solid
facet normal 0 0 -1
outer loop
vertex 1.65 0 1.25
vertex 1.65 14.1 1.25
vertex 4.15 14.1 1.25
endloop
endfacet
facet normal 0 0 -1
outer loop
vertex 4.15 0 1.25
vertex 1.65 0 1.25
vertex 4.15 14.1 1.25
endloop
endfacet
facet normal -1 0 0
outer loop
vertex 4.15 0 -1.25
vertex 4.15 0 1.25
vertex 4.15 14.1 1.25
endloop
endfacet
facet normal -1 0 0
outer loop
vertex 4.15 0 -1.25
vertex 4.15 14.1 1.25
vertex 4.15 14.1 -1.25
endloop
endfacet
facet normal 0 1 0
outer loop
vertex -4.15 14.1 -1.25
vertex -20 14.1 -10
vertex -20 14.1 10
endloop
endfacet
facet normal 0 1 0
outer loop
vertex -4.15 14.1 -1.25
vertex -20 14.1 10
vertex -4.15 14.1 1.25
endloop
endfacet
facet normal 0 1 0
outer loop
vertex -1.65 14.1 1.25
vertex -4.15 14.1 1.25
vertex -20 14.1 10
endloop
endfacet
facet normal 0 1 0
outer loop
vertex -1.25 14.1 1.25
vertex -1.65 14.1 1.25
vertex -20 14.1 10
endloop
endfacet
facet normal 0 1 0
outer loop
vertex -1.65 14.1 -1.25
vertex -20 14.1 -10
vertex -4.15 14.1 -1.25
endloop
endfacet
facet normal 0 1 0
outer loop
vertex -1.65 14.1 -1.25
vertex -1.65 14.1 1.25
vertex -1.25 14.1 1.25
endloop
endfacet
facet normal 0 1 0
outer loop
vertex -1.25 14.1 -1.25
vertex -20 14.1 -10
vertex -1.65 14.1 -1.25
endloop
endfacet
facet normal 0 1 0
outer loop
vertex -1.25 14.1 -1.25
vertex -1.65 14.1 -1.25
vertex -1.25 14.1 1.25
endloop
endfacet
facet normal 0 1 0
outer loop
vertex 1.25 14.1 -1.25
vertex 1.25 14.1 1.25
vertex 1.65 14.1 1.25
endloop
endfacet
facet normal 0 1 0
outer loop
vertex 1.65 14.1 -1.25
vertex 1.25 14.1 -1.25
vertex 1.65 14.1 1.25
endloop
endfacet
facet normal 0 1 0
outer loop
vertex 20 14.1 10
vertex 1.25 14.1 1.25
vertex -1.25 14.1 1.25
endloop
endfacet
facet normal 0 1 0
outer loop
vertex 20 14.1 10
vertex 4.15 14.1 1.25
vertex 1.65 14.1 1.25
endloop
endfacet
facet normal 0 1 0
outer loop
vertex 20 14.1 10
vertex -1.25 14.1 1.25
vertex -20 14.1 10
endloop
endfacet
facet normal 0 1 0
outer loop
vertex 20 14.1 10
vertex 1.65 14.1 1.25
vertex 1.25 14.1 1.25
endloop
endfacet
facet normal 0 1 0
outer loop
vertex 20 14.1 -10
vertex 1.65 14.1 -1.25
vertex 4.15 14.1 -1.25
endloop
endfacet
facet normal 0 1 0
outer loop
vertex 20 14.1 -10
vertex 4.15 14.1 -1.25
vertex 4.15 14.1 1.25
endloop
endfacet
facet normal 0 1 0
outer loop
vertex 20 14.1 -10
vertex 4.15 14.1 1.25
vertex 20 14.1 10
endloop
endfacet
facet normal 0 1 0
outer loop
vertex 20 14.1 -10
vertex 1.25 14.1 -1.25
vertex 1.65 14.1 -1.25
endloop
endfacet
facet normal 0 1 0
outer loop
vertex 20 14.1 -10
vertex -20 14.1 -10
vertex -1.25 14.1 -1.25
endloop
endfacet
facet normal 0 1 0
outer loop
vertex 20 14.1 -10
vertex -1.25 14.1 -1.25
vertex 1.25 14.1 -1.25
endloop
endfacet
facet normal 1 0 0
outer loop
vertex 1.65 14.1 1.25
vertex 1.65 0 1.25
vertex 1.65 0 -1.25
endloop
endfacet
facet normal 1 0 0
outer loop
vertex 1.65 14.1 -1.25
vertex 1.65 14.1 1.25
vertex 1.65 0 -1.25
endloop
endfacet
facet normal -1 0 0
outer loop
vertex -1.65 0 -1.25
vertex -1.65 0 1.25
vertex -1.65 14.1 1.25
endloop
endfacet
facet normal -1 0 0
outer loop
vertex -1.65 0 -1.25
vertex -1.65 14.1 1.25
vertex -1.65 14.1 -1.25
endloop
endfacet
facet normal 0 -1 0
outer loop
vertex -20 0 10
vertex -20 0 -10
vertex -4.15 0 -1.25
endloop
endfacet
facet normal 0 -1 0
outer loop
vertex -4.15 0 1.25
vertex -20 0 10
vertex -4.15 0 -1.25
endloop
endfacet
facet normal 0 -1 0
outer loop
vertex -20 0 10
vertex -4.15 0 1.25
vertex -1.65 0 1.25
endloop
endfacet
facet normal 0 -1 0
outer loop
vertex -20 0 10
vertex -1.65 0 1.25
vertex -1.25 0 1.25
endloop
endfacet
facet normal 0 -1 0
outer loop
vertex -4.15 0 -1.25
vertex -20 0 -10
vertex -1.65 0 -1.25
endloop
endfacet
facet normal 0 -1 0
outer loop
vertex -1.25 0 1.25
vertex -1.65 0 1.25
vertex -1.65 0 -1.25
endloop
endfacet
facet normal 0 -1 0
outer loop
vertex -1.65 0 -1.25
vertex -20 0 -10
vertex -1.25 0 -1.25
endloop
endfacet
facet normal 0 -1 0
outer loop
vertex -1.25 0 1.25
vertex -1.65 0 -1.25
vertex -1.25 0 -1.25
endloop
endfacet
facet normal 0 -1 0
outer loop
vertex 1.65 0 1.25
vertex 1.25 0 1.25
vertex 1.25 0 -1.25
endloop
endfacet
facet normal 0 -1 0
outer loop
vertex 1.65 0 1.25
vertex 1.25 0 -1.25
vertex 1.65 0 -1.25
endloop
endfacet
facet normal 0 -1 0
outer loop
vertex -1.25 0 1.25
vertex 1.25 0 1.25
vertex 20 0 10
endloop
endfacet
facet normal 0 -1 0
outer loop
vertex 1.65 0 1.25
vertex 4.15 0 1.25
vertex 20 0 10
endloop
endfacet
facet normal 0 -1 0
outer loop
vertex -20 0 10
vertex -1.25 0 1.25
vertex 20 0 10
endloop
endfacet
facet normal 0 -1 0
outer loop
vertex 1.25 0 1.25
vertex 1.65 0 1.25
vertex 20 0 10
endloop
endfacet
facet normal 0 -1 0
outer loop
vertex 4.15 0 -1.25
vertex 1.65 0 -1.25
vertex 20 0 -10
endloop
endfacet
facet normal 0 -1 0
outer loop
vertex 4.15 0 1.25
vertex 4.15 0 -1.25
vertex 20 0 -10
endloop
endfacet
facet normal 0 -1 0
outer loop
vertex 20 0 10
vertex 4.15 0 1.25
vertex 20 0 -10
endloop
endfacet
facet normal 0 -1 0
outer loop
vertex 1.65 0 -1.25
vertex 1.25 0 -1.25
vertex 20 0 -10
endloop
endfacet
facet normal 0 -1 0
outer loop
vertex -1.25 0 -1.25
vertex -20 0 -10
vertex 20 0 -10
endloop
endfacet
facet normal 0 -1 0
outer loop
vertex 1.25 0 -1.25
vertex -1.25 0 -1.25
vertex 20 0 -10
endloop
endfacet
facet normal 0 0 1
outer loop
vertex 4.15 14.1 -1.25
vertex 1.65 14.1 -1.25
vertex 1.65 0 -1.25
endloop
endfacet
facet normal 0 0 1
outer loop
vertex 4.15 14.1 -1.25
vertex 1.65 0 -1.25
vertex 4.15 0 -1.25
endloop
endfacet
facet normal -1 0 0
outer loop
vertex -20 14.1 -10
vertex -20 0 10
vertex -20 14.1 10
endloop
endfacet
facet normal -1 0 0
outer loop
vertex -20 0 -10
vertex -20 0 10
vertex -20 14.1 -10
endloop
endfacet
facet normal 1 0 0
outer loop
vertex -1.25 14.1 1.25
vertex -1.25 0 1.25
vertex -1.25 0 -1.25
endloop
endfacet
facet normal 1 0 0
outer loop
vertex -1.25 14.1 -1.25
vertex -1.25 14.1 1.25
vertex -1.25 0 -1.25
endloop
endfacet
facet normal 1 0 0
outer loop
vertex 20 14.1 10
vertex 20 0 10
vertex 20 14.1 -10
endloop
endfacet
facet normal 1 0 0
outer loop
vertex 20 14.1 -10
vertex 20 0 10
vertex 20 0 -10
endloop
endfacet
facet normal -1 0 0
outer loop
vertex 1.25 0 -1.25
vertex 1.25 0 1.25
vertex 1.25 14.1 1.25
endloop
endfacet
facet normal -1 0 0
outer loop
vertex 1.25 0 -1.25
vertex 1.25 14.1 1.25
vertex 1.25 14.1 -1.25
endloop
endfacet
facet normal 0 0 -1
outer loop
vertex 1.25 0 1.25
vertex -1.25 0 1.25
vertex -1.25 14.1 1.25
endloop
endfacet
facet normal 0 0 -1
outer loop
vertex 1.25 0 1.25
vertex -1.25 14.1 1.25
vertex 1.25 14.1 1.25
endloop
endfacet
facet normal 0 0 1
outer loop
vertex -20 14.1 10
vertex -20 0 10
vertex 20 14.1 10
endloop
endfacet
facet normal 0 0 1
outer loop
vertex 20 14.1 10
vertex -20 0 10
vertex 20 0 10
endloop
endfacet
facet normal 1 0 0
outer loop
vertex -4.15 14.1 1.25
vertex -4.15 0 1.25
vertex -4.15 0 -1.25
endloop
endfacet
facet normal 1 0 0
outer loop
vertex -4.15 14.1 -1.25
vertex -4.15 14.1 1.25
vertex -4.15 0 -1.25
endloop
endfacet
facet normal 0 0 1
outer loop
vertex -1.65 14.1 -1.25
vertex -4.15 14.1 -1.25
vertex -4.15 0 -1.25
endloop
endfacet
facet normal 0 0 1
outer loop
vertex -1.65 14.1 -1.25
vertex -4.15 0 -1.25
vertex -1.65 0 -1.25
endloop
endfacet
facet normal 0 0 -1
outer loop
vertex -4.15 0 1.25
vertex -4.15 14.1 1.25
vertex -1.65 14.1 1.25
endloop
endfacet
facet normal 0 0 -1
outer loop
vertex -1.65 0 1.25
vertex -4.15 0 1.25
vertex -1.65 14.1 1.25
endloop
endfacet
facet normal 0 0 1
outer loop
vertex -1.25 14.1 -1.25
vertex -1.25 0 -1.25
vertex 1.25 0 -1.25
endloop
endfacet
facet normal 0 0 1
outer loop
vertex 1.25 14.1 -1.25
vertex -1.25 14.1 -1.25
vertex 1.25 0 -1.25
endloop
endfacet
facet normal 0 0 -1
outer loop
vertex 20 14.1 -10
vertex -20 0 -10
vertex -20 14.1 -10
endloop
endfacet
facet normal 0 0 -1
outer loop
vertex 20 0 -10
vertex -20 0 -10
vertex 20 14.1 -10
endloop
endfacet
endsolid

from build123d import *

# Parameters (mm, degrees)
ESQUISSE1_W             = 40
ESQUISSE1_H             = 20
BOSS_EXTRU_2_DEPTH      = 14.1
ESQUISSE2_W             = 2.5
ESQUISSE2_H             = 2.5
ENL_V_MAT_EXTRU_1_DEPTH = 27.435014659


with BuildPart() as part:
    # Esquisse1 → Boss.-Extru.2 (new body)
    with BuildSketch(Plane(origin=(0, 0, 0), x_dir=(1, 0, 0), z_dir=(0, 1, 0))):
        Rectangle(ESQUISSE1_W, ESQUISSE1_H)
    extrude(amount=BOSS_EXTRU_2_DEPTH)

    # Esquisse2 → Enlèv. mat.-Extru.1 (cut, through all)
    with BuildSketch(Plane(origin=(0, 14.1, 0), x_dir=(1, 0, 0), z_dir=(0, 1, 0))):
        with Locations((-2.9, 0)):
            Rectangle(ESQUISSE2_W, ESQUISSE2_H)
        Rectangle(ESQUISSE2_W, ESQUISSE2_H)
        with Locations((2.9, 0)):
            Rectangle(ESQUISSE2_W, ESQUISSE2_H)
    extrude(amount=-ENL_V_MAT_EXTRU_1_DEPTH, mode=Mode.SUBTRACT)


solid = part.part
